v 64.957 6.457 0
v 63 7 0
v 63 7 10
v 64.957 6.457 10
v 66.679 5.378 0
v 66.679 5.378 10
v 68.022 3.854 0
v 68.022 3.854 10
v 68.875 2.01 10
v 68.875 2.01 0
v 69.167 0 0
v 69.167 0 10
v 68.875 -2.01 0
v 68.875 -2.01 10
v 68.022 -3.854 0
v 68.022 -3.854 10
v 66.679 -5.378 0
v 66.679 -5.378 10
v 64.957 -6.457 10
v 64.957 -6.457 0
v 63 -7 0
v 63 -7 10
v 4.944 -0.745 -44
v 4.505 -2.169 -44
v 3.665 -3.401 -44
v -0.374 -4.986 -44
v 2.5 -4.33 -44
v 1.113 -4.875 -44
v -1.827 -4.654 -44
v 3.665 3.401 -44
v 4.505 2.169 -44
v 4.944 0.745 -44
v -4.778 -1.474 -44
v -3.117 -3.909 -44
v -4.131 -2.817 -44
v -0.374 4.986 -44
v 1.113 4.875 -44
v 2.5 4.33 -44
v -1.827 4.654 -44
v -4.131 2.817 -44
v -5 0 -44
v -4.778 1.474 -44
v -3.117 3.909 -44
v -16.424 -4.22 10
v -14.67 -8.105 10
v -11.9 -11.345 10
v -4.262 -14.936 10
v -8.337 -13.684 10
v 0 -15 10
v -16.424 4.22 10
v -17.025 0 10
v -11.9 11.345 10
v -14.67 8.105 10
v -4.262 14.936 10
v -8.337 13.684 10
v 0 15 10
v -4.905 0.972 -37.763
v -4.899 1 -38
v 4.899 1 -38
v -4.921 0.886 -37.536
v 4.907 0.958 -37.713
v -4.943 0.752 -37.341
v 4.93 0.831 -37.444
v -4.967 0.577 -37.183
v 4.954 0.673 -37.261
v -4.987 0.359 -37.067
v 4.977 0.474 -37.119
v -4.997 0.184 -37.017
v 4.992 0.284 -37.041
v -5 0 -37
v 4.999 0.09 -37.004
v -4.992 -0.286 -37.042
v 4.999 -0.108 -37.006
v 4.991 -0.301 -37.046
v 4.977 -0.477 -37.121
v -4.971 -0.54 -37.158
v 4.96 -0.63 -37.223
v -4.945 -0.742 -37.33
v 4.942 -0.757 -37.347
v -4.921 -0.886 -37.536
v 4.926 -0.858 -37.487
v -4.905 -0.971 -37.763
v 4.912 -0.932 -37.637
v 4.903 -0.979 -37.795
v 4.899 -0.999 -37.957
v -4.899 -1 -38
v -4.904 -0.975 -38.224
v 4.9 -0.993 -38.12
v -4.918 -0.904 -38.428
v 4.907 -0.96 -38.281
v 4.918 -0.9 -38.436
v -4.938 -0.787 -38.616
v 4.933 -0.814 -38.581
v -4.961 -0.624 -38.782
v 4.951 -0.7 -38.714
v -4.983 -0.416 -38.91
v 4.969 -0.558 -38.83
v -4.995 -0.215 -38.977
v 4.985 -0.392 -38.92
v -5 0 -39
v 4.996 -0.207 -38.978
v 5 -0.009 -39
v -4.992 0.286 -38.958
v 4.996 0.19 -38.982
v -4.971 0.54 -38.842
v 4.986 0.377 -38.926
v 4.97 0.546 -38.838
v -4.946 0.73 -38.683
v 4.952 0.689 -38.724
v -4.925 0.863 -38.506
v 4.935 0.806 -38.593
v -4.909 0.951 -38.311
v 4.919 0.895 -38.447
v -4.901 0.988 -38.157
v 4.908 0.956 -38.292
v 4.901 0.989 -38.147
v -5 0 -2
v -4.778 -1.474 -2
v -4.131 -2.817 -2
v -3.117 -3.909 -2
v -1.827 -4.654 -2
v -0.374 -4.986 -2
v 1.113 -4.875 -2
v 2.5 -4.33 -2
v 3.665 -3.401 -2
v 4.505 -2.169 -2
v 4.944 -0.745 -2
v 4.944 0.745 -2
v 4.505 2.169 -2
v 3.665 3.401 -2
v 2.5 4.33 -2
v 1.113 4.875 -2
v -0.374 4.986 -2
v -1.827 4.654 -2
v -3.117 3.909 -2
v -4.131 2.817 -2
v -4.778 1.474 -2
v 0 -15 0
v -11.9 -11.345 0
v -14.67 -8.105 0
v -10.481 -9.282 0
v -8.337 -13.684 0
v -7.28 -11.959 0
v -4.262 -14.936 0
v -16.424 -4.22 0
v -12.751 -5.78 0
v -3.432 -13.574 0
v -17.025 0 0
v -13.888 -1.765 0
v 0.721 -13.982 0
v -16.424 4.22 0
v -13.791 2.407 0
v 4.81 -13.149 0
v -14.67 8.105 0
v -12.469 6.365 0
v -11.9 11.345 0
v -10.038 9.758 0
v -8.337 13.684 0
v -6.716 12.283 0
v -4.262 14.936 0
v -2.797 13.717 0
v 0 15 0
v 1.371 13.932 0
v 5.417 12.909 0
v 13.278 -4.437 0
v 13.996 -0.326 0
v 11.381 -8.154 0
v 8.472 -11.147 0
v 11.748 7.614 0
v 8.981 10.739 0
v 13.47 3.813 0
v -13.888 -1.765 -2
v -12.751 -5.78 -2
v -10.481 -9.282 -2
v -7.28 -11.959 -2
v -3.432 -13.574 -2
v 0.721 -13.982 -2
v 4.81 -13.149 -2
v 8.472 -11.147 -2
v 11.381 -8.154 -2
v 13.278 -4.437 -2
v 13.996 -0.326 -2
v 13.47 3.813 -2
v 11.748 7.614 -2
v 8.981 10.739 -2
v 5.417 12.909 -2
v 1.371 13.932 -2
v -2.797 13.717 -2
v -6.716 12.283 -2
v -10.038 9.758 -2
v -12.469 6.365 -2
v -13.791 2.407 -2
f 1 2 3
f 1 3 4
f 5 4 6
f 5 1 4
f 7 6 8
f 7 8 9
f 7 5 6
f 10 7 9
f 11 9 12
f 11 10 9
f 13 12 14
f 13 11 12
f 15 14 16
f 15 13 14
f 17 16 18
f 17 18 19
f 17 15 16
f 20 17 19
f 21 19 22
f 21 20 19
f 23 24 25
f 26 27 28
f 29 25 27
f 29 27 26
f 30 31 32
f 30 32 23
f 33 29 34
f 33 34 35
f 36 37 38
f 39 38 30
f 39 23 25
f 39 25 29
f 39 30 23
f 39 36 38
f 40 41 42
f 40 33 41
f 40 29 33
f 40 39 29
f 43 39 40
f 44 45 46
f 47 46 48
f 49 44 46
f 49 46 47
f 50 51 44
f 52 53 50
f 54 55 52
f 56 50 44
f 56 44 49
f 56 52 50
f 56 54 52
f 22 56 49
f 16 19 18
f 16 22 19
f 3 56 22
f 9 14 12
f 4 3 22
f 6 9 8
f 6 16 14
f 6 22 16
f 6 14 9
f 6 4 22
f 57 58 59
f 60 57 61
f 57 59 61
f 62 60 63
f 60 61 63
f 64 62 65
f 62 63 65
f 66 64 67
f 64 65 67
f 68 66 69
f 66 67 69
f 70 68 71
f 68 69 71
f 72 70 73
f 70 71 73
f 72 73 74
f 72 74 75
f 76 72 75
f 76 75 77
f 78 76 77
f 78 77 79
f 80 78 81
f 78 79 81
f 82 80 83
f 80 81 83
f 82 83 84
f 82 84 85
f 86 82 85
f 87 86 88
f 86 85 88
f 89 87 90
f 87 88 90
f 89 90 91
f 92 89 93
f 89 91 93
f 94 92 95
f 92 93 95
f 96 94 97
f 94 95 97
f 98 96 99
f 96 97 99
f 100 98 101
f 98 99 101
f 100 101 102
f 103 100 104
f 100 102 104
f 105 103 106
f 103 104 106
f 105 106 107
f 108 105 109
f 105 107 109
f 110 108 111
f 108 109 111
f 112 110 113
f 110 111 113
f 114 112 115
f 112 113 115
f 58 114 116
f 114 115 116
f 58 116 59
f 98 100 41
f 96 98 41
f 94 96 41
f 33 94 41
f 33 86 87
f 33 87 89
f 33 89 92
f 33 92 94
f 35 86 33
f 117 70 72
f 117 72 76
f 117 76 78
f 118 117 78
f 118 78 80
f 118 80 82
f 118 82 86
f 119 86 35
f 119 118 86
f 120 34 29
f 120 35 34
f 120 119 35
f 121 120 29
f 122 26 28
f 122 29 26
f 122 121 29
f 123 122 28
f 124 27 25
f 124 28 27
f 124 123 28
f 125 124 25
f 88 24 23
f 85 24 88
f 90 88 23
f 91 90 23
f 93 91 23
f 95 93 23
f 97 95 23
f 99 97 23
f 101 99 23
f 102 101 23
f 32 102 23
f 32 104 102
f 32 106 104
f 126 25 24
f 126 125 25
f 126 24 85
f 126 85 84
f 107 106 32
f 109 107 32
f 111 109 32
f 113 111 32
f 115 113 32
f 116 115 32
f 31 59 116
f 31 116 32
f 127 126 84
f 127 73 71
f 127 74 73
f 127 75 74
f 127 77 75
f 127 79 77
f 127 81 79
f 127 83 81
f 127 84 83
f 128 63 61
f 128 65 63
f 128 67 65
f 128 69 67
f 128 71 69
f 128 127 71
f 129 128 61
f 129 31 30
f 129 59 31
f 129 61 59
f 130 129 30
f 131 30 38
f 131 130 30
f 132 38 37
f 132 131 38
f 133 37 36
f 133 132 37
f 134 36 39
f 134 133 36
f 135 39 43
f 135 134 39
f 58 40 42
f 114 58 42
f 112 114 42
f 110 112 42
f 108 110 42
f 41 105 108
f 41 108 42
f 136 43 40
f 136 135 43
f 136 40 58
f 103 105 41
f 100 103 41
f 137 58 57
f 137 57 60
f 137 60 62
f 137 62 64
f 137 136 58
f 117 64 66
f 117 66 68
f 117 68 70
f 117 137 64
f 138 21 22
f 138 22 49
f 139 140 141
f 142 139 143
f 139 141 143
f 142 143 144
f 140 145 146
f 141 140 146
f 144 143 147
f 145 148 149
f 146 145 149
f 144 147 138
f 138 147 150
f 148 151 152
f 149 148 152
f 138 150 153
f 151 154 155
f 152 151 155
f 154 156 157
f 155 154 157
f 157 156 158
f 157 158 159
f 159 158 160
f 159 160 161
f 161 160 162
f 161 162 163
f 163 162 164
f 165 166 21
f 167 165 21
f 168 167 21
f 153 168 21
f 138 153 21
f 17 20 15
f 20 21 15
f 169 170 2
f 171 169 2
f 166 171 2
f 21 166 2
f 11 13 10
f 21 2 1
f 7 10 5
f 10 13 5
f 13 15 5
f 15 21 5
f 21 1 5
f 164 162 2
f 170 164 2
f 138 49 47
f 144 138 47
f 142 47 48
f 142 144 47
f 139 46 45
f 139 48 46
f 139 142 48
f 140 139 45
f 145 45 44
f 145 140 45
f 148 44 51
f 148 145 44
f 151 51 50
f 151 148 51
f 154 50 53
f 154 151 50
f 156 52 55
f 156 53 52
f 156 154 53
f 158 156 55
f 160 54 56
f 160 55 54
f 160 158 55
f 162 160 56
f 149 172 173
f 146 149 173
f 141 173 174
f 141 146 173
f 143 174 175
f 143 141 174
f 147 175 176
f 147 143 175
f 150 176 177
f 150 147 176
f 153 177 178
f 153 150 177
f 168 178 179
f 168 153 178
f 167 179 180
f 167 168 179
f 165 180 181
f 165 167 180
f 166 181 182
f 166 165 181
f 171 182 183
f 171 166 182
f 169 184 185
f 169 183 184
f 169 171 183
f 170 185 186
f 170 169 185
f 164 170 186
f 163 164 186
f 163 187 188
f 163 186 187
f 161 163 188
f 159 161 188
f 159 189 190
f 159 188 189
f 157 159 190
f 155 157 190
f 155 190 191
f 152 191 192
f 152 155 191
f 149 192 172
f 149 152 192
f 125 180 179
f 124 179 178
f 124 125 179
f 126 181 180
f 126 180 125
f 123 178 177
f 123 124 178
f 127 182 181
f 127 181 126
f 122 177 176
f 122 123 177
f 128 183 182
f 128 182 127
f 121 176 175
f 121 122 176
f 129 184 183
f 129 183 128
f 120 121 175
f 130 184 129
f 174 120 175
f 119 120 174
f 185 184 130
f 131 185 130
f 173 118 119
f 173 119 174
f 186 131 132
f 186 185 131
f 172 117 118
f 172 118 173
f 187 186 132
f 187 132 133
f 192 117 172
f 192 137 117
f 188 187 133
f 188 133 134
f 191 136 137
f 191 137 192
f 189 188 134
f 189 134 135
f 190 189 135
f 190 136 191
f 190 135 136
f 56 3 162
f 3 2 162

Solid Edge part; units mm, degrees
sketch "Sketch1" plane through (0, 0, 0) normal (0, 0, 1) x (1, 0, 0)
  line L0 (63, 7) -> (0, 15)
  arc A0 (0, 15) -> (0, -15) centre (-1.9048, 0) ccw
  line L1 (63, -7) -> (0, -15)
  arc A1 (63, 7) -> (63, -7) centre (62.1111, 0) cw
extrude "Protrusion1" add sketch "Sketch1" along normal blind 10
sketch "Sketch2" plane through (26.0711, 0, 0) normal (0, 0, -1) x (-0.992, -0.126, 0)
  circle A0 centre (25.8634, 3.2842) radius 14
extrude "ExtrudedProtrusion_3" add sketch "Sketch2" along normal blind 2
sketch "Sketch3" plane through (26.0711, 0, -2) normal (0, 0, -1) x (-1, 0, 0)
  circle A0 centre (26.0711, 0) radius 5
extrude "ExtrudedProtrusion_2" add sketch "Sketch3" along normal blind 42
sketch "Sketch4" plane through (0, 0, 0) normal (1, 0, 0) x (0, 1, 0)
  circle A0 centre (0, -38) radius 1
  dimension "D1" = 36
extrude "Cutout1" cut sketch "Sketch4" along normal mid plane 36.7222
